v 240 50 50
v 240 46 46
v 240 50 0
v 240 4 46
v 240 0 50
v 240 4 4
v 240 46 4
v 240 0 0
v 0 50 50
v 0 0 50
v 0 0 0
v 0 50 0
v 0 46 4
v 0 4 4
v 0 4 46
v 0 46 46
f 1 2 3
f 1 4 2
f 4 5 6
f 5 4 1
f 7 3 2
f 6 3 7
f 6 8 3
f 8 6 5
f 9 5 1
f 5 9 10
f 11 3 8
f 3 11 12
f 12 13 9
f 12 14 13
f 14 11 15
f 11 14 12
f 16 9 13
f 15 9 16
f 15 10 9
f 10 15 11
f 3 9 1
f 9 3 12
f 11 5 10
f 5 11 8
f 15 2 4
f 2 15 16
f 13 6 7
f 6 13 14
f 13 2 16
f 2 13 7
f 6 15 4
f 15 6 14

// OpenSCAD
$fn = 32;

// ----------------------------------------------------------------------
// Box beam: 200-250 mm hollow beam
// ----------------------------------------------------------------------

// --- parameters (mm) ---
beam_l = 240;             // beam length, X
beam_w = 50;              // beam width, Y
beam_h = 50;              // beam height, Z
wall = 4;                 // wall thickness
fit_tol = 0.1;            // tolerance for press fits, mm
free_tol = 0.3;           // tolerance for clearance fits, mm

difference() {
  cube([beam_l, beam_w, beam_h]);
  translate([-1, wall, wall])
    cube([beam_l + 2, beam_w - 2 * wall, beam_h - 2 * wall]);
}
